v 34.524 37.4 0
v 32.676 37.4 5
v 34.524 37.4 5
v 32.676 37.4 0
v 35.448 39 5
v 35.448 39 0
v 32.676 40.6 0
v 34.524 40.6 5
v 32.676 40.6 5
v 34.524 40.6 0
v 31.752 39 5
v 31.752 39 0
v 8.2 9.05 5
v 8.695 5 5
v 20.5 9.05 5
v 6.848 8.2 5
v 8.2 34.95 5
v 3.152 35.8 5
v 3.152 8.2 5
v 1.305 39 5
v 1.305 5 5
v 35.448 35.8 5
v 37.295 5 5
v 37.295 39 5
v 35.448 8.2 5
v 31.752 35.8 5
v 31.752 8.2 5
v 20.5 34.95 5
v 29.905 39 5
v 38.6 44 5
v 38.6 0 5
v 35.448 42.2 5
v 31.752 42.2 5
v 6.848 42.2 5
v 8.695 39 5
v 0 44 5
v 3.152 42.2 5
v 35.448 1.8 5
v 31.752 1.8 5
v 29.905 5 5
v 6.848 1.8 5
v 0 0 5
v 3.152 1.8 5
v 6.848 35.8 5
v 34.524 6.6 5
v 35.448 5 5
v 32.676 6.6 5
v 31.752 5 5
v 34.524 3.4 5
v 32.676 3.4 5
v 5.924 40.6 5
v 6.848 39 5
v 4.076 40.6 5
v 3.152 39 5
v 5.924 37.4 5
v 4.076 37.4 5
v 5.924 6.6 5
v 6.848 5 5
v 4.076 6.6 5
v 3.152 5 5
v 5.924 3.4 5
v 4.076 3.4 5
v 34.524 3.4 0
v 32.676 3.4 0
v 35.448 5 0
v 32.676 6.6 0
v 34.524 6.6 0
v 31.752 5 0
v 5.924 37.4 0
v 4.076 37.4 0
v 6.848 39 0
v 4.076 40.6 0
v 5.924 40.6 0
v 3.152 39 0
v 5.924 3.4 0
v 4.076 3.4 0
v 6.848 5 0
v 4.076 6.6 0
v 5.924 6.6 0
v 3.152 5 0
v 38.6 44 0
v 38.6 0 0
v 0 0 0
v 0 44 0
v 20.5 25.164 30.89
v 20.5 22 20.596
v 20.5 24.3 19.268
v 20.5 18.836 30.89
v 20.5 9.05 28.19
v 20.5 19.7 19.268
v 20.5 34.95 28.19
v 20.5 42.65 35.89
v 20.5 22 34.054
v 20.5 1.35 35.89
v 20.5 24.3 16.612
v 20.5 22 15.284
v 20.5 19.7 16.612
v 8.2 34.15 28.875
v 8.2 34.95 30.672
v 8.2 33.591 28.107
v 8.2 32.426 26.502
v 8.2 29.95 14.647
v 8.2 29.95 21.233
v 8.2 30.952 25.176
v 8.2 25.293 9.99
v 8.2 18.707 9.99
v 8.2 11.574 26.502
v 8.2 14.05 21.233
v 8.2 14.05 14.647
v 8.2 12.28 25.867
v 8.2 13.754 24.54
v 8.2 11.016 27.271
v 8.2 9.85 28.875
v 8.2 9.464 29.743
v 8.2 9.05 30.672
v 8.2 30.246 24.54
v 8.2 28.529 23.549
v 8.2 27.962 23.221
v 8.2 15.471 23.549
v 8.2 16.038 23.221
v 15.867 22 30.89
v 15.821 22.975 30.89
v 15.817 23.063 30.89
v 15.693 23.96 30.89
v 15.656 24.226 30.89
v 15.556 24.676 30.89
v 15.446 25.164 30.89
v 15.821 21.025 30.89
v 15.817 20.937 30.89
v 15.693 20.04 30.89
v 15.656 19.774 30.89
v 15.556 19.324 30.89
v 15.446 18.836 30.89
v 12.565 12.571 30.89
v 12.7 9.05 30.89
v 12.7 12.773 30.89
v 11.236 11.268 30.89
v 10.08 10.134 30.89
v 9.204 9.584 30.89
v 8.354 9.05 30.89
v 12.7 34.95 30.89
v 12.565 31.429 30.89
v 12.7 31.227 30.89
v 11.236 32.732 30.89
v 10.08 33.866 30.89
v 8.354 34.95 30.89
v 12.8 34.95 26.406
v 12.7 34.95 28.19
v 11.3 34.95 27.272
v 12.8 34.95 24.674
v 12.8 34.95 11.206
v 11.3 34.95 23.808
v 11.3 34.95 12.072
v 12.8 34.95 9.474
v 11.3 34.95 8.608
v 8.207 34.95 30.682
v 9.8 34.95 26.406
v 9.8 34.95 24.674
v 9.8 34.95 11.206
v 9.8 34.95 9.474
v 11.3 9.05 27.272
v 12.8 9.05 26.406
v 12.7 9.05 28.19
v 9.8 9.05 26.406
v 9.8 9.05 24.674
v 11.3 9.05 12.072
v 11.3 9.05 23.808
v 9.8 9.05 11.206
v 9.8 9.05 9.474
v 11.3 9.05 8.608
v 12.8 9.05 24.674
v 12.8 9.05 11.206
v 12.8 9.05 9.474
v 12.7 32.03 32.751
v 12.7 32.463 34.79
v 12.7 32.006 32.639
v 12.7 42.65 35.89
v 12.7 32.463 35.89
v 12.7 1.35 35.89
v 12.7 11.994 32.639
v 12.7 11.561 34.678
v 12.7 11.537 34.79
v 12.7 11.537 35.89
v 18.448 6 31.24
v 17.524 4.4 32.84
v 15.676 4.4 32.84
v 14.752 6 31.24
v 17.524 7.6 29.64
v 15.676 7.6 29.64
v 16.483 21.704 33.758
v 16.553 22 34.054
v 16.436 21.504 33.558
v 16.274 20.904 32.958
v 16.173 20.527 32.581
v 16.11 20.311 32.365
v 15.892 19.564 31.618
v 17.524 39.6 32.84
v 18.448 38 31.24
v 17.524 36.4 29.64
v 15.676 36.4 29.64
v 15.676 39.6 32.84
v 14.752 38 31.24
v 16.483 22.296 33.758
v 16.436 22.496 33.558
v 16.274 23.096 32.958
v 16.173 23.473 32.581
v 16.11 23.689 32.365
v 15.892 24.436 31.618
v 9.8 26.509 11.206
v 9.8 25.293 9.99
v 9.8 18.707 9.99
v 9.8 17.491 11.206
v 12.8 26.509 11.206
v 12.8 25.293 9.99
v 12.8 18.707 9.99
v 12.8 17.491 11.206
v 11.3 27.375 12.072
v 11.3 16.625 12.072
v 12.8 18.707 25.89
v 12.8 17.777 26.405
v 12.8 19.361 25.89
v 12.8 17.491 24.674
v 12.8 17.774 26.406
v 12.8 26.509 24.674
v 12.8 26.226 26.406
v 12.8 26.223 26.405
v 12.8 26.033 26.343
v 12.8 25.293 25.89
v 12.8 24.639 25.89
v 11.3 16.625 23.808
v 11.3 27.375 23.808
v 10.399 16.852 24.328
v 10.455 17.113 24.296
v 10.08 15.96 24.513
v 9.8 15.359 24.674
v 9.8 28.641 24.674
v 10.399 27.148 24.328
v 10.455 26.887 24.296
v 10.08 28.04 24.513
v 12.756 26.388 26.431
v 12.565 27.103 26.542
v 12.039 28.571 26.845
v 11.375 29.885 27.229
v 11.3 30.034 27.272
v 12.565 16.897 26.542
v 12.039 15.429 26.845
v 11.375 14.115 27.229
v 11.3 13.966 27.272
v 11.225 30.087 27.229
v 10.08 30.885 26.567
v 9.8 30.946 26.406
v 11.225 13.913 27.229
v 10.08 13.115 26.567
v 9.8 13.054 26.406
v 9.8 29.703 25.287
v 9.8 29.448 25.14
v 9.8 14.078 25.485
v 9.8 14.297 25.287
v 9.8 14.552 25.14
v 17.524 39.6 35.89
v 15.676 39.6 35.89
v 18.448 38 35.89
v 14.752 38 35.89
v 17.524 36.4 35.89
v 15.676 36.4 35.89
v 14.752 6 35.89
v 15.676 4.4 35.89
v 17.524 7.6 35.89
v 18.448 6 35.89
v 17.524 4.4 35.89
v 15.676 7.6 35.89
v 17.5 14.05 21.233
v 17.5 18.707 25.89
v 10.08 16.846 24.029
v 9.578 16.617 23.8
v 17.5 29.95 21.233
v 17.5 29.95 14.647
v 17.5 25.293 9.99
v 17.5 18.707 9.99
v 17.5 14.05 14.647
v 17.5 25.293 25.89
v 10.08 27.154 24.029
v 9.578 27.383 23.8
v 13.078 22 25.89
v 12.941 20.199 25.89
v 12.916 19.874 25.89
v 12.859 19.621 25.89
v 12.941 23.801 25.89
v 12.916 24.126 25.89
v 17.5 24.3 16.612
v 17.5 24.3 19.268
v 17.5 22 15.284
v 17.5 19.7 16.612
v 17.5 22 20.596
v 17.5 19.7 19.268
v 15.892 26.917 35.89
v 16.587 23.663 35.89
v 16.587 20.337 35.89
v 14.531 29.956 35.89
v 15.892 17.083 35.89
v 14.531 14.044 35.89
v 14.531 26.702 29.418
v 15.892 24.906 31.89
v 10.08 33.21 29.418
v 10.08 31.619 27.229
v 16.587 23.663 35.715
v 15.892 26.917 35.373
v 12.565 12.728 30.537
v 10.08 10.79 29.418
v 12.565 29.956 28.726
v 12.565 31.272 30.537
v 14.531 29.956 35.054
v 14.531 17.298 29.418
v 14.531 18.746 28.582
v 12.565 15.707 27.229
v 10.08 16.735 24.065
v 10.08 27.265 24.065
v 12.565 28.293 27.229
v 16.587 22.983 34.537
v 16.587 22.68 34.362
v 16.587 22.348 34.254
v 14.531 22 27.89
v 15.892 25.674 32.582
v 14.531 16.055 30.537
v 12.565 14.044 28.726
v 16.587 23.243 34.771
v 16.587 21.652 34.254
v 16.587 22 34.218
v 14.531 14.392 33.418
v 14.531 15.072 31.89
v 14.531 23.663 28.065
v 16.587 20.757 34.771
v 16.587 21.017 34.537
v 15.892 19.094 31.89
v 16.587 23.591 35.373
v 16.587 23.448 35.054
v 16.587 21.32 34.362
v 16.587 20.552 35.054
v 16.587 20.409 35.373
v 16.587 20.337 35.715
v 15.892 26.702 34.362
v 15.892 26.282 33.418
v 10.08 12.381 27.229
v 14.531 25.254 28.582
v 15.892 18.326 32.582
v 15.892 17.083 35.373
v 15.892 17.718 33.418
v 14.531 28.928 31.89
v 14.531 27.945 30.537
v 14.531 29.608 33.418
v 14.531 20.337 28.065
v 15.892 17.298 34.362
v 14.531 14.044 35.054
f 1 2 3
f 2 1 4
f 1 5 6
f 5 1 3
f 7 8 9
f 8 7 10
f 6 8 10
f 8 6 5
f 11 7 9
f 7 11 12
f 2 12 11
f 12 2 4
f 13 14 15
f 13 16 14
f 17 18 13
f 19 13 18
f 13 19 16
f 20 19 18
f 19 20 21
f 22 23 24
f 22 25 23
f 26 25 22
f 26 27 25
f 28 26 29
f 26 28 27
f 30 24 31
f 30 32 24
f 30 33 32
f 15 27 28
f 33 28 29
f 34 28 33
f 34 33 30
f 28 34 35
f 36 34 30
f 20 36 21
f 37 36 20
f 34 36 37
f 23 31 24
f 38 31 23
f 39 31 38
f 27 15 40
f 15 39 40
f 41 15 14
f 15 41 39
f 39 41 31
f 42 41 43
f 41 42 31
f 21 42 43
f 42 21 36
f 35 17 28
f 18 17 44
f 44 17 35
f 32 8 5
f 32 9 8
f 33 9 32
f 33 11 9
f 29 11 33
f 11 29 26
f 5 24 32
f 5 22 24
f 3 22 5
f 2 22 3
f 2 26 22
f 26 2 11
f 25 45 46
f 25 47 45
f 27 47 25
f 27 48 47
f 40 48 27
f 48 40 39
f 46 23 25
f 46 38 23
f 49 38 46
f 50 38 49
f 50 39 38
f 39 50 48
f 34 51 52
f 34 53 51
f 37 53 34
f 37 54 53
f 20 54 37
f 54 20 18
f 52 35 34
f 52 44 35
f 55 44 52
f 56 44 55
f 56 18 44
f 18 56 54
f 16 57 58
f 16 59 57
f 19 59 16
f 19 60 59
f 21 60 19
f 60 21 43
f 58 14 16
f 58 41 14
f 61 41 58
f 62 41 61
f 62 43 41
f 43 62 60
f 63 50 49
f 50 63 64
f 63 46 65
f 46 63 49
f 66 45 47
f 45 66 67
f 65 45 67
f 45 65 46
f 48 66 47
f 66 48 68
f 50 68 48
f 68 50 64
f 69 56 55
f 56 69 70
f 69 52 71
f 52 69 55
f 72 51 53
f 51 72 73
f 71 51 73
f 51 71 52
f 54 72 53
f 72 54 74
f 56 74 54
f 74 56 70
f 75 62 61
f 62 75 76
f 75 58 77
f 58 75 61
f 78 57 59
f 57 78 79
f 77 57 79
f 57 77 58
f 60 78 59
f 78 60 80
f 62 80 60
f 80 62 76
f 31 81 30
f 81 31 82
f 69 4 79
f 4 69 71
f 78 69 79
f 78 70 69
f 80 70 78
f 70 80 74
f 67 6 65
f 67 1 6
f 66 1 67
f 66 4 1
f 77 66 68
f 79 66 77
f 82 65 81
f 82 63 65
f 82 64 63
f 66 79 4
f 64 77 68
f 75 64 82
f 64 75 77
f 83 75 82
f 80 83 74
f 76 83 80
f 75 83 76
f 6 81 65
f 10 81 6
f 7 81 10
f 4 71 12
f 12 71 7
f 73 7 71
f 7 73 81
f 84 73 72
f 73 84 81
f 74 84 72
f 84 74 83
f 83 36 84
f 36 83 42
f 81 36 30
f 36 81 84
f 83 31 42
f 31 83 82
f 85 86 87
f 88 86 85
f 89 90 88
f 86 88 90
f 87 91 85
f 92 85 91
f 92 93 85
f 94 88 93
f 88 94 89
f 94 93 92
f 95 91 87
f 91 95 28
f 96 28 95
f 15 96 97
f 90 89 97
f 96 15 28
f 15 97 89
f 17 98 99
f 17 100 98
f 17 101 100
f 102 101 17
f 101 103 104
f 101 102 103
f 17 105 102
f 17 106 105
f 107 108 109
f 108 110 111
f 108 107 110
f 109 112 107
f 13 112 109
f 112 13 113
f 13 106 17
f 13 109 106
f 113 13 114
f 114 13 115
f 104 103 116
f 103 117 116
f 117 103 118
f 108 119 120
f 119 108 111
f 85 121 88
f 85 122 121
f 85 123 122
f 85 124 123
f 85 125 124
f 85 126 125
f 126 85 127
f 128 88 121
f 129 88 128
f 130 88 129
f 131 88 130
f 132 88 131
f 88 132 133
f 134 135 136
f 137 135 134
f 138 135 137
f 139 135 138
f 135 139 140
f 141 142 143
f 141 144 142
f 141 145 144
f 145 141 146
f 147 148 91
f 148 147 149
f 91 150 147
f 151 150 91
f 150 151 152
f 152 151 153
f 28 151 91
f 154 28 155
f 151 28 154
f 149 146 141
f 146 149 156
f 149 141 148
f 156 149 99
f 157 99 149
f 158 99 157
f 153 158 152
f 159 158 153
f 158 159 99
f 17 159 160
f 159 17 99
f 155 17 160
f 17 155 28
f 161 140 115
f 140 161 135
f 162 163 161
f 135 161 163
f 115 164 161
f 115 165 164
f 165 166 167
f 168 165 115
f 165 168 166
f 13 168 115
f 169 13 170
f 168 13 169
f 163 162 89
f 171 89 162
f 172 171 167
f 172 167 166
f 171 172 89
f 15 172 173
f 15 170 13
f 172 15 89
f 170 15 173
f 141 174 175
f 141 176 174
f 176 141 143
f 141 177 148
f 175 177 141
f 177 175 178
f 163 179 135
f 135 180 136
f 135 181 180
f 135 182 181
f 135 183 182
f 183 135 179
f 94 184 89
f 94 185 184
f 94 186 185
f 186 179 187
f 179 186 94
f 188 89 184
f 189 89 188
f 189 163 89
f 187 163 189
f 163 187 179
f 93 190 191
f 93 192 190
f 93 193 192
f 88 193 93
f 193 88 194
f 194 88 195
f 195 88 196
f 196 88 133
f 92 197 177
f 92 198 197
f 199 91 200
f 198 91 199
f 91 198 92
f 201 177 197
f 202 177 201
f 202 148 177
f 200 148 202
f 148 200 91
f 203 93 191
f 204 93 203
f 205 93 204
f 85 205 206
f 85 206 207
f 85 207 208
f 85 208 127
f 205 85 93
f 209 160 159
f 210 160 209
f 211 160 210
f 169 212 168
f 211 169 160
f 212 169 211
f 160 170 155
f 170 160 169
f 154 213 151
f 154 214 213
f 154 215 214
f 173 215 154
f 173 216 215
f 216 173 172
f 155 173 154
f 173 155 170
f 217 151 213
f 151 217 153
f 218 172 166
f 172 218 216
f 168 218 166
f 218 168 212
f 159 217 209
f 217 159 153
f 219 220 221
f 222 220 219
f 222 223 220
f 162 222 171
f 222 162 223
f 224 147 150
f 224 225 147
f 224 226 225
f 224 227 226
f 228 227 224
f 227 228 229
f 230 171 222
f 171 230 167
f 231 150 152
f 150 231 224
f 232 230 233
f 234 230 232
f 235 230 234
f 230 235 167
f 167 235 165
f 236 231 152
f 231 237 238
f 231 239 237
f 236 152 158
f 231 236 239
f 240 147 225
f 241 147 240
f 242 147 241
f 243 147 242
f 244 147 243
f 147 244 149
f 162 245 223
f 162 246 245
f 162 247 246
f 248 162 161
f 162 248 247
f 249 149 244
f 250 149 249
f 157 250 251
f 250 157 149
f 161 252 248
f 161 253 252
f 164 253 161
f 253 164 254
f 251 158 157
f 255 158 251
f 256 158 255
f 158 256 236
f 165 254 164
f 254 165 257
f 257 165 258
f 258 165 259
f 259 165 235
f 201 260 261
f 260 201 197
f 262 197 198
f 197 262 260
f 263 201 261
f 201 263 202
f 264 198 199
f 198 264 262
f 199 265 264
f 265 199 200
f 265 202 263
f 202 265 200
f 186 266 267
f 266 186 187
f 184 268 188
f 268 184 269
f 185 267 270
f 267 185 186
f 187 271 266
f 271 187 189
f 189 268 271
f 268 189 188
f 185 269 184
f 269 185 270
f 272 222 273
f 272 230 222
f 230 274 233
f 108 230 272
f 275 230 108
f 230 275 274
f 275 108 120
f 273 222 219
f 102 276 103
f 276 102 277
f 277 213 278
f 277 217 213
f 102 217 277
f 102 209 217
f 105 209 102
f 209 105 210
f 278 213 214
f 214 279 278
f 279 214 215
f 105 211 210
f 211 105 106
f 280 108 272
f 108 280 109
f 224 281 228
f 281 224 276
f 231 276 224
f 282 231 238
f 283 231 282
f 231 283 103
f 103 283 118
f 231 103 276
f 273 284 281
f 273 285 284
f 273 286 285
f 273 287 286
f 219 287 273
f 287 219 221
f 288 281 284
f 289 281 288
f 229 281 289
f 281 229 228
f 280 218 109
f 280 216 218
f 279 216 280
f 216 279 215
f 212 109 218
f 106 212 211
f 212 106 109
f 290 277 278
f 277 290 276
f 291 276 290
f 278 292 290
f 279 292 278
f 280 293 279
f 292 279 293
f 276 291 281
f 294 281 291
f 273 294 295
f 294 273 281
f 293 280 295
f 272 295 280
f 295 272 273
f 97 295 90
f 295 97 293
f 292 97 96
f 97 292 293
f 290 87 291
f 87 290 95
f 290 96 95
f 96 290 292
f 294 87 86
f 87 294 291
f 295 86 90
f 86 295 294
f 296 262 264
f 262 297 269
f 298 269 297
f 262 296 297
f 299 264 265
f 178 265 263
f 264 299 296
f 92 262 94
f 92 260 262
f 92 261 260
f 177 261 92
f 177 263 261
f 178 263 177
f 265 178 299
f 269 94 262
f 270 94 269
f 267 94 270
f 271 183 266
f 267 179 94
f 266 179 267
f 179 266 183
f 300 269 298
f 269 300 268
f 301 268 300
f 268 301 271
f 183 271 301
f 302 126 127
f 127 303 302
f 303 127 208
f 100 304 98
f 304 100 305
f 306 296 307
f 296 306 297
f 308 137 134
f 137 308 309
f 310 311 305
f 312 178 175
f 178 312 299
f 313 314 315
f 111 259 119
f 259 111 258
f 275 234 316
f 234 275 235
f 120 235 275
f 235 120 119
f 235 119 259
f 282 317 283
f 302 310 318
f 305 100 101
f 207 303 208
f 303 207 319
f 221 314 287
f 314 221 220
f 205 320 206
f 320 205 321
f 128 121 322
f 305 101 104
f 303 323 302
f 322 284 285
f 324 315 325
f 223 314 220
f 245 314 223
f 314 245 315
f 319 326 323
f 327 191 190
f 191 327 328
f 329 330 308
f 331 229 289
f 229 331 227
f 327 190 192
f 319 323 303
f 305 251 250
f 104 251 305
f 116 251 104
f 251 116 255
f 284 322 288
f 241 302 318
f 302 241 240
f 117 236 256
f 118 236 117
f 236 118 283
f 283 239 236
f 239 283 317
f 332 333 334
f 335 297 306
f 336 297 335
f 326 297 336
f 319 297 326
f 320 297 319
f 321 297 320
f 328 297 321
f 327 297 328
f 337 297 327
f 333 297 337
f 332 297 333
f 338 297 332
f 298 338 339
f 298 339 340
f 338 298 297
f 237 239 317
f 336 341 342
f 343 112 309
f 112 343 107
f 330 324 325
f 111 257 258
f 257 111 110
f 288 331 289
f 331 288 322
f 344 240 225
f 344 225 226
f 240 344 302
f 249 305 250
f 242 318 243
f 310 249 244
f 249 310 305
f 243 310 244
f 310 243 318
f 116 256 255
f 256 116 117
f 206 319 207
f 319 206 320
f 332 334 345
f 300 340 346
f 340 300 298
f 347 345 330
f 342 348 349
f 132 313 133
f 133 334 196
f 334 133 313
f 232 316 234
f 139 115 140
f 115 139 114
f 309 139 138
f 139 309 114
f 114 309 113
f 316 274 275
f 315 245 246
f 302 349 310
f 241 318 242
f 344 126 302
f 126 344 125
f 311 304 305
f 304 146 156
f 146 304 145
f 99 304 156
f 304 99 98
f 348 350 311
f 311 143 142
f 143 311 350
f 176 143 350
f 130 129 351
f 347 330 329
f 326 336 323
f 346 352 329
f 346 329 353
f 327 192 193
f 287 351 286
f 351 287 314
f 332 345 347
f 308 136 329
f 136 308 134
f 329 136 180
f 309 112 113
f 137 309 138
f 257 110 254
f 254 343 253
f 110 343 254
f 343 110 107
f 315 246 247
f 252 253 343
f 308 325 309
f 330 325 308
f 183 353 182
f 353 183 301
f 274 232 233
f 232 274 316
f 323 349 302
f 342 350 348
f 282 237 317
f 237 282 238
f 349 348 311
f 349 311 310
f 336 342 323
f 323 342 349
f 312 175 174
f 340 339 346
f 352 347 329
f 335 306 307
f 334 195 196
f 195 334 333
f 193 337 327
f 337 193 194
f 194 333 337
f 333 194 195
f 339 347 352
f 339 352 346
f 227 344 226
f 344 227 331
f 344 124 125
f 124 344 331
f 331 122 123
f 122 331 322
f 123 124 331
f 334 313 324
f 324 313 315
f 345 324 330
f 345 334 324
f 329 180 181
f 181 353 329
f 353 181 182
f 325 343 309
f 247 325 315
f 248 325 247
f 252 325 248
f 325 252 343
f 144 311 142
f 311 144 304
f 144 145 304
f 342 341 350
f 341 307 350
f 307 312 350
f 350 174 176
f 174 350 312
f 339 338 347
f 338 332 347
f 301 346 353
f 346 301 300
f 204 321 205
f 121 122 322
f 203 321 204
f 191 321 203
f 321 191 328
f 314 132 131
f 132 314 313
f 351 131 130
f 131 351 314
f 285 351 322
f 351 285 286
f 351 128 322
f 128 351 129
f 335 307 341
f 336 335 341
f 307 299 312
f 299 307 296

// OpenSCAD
// file: vars.scad
// Variables used throughout design.
// Yes, these could use some commenting.
// (c) 2014, Christopher "ScribbleJ" Jansen
huge=500;

printer_w = 400;
printer_l = 400;
printer_h = 400;

bearing_w = 7;
bearing_d = 22;
bearing_r = bearing_d/2;
bearing_hole_d = 8;
bearing_hole_r = bearing_hole_d/2;


misc_bolt_d = 3.2;
misc_bolt_r = misc_bolt_d/2;
misc_nut_r  = misc_bolt_d;
misc_bolt_pitch = 0.5;
misc_bolthead_d = misc_bolt_d*2;
misc_bolthead_r = misc_bolthead_d/2;

retainer_shell_thick = 0.5;
retainer_shell_sep   = 0.25;
//retainer_lip_thick   = 1;
retainer_lip_thick   = 2;
retainer_inner_width = 1;

belt_w    = 6;
belt_thick= 2;
belt_sep  = retainer_lip_thick*2 + 2;

calc_retainer_h  = retainer_lip_thick*2 + belt_w;
calc_retainer_ir = bearing_r + retainer_shell_thick*2 + retainer_shell_sep;
calc_retainer_or = calc_retainer_ir + belt_thick;
calc_retainer_b_off = retainer_lip_thick - (bearing_w-belt_w)/2;

tslot_w = 20;
tslot_bolt_d = 5;
tslot_bolt_r = tslot_bolt_d/2;
tslot_bolt_l = 4;
tslot_bolthead_d = 10;
tslot_bolthead_r = tslot_bolthead_d/2;


corner_thick = 5;
corner_length = tslot_w*3;

rod_d=8;
rod_r=rod_d/2;

bushing_d=15;
bushing_r=bushing_d/2;
bushing_l=10;
bushing_flange_r = bushing_r+3;
bushing_flange_w = 1;
bushing_material_thick = 5;

x_rod_sep = 50;
x_carriage_l = 50;
x_mount_sep_x = x_carriage_l - misc_bolthead_r*2*2 - misc_bolt_r*2;
x_mount_offset = bushing_r + misc_bolt_r * 2;
belt_above_x = bushing_r+misc_nut_r*2;
belt_clamp_w = 7;
x_rod_past_bearing = 20;

//belt_above_y = belt_above_x + x_rod_sep/2;
//y_above_x = belt_above_x-belt_above_y;
belt_above_y = 45;
y_above_x = belt_above_x-belt_above_y;




bearing_mount_base = corner_thick;
bearing_mount_extra = 2;
belt_above_bearing_mount = bearing_mount_base + bearing_mount_extra + retainer_lip_thick;
bearing_mount_support_tweak = 30;

y_bearing_offset = bushing_r+bushing_material_thick-calc_retainer_ir;

y_bearing_sep_y = calc_retainer_ir*2+belt_thick;
y_bearing_sep_z = belt_w+belt_sep;
bearing_bolt_r  = 4;
bearing_bolt_pitch = 1.25;
bearing_bolt_holder_thick = 4;
y_carriage_from_tslot = 2;

y_carriage_len = 50;

motor_w = 42.3;
motor_h = motor_w;
motor_bolt_sep = 31.0;
motor_bolt_r   = 1.5;
motor_pulley_d = 10;
motor_pulley_r = motor_pulley_d/2;
motor_pulley_h = 5.3;
motor_flange_d = 23;
motor_flange_r = motor_flange_d/2;
motor_corner_extra_hole_pos = tslot_bolt_r+3;

calc_corner_from_y_rod = x_rod_past_bearing+corner_thick+y_carriage_from_tslot+tslot_w;
calc_corner_above_x = belt_above_x - belt_above_bearing_mount + bearing_mount_base;

calc_motor1_above_x  = belt_above_x - motor_pulley_h;
calc_motor2_above_x  = belt_above_x - motor_pulley_h + belt_w + belt_sep;
calc_motor_from_y_rod = -bushing_r - bushing_material_thick + bearing_bolt_holder_thick + bearing_bolt_r + calc_retainer_or + motor_pulley_r;

motor_bracket_thick = 12;
motor_bracket_wide = (motor_w - motor_flange_d) / 2;
motor_bracket_len  = motor_w;
motor_bolt_offset  = (motor_w - motor_bolt_sep) / 2;

z_rod_sep = 150;
z_motor_off = motor_h - tslot_w - corner_thick;

laser_mat_thick = 4.75;
laser_mat_margin = laser_mat_thick;
bed_mount_sep   = 209;
bed_from_z      = 60;
bed_box_r       = 25;
bed_box_h       = 50;
z_ends_sep = printer_l - tslot_w*2 - corner_thick*2 - motor_w;
platform_l      =  laser_mat_margin*2 + laser_mat_thick*2 + bed_box_r*2 + z_ends_sep;
platform_w      = bed_mount_sep + misc_bolt_r*2 + laser_mat_margin*2;
z_leadscrew_passthrough_r = 12/2;
leadscrew_bolt_offset = 22/2;
leadscrew_bolt_r = 3.2/2;
laser_bushing_fudge = 0.1;


lm8uu_d=15;
lm8uu_r=lm8uu_d/2;
lm8uu_bolt_r=5/2;
lm8uu_nut_r=10/2;

arduino_width=60;
// file: common.scad
// Common functions used in various places throughout.
// (c) 2014, Christopher "ScribbleJ" Jansen
include <vars.scad>

// Reduce radius of holes intended to hold bolts by threads.
// 0.86603 * p = nominal depth of threads.  1/3-1/2 of that is about right.
function smallhole(r,p) = r - ((p*0.86603)/3);

// Polyhole derived from Nophead's Polyhole work: http://hydraraptor.blogspot.com/2011/02/polyholes.html
module polyhole(r,h,v=6,a=0)
{
  rotate([0,0,a]) cylinder( h = h, r = r  / cos( 180 / v ), $fn = v );
}
// 2D version of Polyhole
module polycircle(r,v=6,a=0)
{
  rotate([0,0,a]) circle(r = r  / cos( 180 / v ), $fn = v );
}
// Cutout for bolthole
module bolt(bolt_r = misc_bolt_r,bolthead_r = misc_bolthead_r,bolt_len = huge,v=6,a=0)
{
  translate([0,0,-bolt_len]) polyhole(r=bolt_r,h=bolt_len+1,v=v,a=a);
  polyhole(r=bolthead_r,h=huge,v=v,a=a);
}
// 2D ring
module ring(inner=5,outer=10,v=32)
{
  difference()
  {
    circle(r=outer);
    polycircle(r=inner,v=v);
  }
} 
// 2D Rounded square
module roundsquare(dim=[50,50],r=5)
{
  translate([0,r]) square([dim[0], dim[1] - r*2]);
  translate([r,0]) square([dim[0] - r*2, dim[1]]);
  for(x=[r,dim[0]-r])
  for(y=[r,dim[1]-r])
    translate([x,y]) circle(r=r);
}
// Lasercutting Tabs
module maketabs(l=100,w=5,num=10)
{
  tablength=l/(num * 2);
  for(x=[tablength/2:tablength*2:l])
    translate([x,0]) square([tablength,w]);
}
// Support for printing bearing mount
module support(l=bearing_mount_base+bearing_mount_extra+y_bearing_sep_z+calc_retainer_b_off,w=bearing_hole_d * tan(180/6) *2,extra=0,extra_l=0)
{
  translate([-w/2,0,-l]) 
  {
    difference()
    {
      rotate([45,0,0]) cube([w,huge/2,huge/2]);
      translate([-huge/2,0,0]) cube([huge,huge,huge]);
      translate([-huge/2,-huge/2,l]) cube([huge,huge,huge]);
    }
    translate([0,-extra,-extra_l/2]) cube([w,extra,extra_l]);
  }

}
// main file
// X-Carriage adaptor for bowden J-head.
// Optional.  Print 1.
// (c) 2014, Christopher "ScribbleJ" Jansen
include <common.scad>

jhead_top_h = 4.8;
jhead_top_d = 15.9;
jhead_top_r = jhead_top_d/2;
jhead_groove_d = 12.2;
jhead_groove_r = jhead_groove_d/2;
jhead_groove_h = 4.5;

ptc_thread_d = 4.6;
ptc_thread_r = ptc_thread_d/2;
ptc_thread_l = 3;

fan_bolt_sep = 32;
fan_bolt_off = fan_bolt_sep - (jhead_top_d+corner_thick*2);

groove_bolt_d = 3;
groove_bolt_r = groove_bolt_d/2;

jhead_bowden();

module jhead_bowden()
{
  xconn();
  translate([corner_thick+misc_nut_r,x_mount_sep_x/2+corner_thick,corner_thick-0.01]) rotate([0,90,0]) translate([-jhead_top_d-corner_thick*2,-jhead_top_r-corner_thick,0]) jhead();
}

module xconn()
{
  difference()
  {
    cube([x_rod_sep-x_mount_offset*2+corner_thick*2,x_mount_sep_x+corner_thick*2,corner_thick]);

    translate([x_rod_sep/2 - x_mount_offset + corner_thick,x_mount_sep_x/2+corner_thick,0])
    {
      for(x=[x_rod_sep/2 - x_mount_offset,-x_rod_sep/2 + x_mount_offset])
      for(y=[x_mount_sep_x/2,-x_mount_sep_x/2])
        translate([x,y,corner_thick]) bolt(bolt_r=misc_bolt_r,bolthead_r=misc_bolthead_r);
    }
  }
}



module jhead()
{

  difference()
  {
    union()
    {
      cube([jhead_top_d+corner_thick*2,jhead_top_d+corner_thick*2,jhead_top_h+jhead_groove_h+ptc_thread_l]);
      //translate([0,jhead_top_r+corner_thick,jhead_groove_h+jhead_top_h/2]) scale([20,20,(jhead_top_h+ptc_thread_l)/2]) sphere(r=1, $fn=32);
      translate([-corner_thick,-fan_bolt_off-misc_bolt_r,jhead_groove_h]) rotate([0,0,45]) cube([jhead_top_d,jhead_top_d,jhead_top_h+ptc_thread_l]);
      translate([-corner_thick,jhead_top_d+corner_thick*2+fan_bolt_off+misc_bolt_r,jhead_groove_h]) rotate([0,0,-45-90]) cube([jhead_top_d,jhead_top_d,jhead_top_h+ptc_thread_l]);
    }

    translate([-huge-corner_thick,-huge/2,-1]) cube([huge,huge,huge]);

    translate([jhead_top_r+corner_thick,jhead_top_r+corner_thick,-1])
    {
      // Jhead
      polyhole(r=jhead_top_r,h=jhead_top_h+jhead_groove_h+1,v=8,a=360/16);
      // PTC
      polyhole(r=ptc_thread_r,h=huge);
      // Jhead groove
      for(x=[jhead_groove_r+groove_bolt_r,-jhead_groove_r-groove_bolt_r])
        translate([x,huge/2,1.1+jhead_groove_h-groove_bolt_r]) rotate([90,0,0]) polyhole(r=groove_bolt_r,h=huge);
      // Fan
      for(y=[fan_bolt_sep/2,-fan_bolt_sep/2])
        translate([-huge/2,y,1+jhead_groove_h+(jhead_top_h+ptc_thread_l)/2]) rotate([0,90,0]) polyhole(r=misc_bolt_r,h=huge);
    }

    // Fan 'duct'
    translate([-5,jhead_top_r+corner_thick,jhead_groove_h+jhead_top_r/2+4-20]) sphere(r=16);
  }
}
